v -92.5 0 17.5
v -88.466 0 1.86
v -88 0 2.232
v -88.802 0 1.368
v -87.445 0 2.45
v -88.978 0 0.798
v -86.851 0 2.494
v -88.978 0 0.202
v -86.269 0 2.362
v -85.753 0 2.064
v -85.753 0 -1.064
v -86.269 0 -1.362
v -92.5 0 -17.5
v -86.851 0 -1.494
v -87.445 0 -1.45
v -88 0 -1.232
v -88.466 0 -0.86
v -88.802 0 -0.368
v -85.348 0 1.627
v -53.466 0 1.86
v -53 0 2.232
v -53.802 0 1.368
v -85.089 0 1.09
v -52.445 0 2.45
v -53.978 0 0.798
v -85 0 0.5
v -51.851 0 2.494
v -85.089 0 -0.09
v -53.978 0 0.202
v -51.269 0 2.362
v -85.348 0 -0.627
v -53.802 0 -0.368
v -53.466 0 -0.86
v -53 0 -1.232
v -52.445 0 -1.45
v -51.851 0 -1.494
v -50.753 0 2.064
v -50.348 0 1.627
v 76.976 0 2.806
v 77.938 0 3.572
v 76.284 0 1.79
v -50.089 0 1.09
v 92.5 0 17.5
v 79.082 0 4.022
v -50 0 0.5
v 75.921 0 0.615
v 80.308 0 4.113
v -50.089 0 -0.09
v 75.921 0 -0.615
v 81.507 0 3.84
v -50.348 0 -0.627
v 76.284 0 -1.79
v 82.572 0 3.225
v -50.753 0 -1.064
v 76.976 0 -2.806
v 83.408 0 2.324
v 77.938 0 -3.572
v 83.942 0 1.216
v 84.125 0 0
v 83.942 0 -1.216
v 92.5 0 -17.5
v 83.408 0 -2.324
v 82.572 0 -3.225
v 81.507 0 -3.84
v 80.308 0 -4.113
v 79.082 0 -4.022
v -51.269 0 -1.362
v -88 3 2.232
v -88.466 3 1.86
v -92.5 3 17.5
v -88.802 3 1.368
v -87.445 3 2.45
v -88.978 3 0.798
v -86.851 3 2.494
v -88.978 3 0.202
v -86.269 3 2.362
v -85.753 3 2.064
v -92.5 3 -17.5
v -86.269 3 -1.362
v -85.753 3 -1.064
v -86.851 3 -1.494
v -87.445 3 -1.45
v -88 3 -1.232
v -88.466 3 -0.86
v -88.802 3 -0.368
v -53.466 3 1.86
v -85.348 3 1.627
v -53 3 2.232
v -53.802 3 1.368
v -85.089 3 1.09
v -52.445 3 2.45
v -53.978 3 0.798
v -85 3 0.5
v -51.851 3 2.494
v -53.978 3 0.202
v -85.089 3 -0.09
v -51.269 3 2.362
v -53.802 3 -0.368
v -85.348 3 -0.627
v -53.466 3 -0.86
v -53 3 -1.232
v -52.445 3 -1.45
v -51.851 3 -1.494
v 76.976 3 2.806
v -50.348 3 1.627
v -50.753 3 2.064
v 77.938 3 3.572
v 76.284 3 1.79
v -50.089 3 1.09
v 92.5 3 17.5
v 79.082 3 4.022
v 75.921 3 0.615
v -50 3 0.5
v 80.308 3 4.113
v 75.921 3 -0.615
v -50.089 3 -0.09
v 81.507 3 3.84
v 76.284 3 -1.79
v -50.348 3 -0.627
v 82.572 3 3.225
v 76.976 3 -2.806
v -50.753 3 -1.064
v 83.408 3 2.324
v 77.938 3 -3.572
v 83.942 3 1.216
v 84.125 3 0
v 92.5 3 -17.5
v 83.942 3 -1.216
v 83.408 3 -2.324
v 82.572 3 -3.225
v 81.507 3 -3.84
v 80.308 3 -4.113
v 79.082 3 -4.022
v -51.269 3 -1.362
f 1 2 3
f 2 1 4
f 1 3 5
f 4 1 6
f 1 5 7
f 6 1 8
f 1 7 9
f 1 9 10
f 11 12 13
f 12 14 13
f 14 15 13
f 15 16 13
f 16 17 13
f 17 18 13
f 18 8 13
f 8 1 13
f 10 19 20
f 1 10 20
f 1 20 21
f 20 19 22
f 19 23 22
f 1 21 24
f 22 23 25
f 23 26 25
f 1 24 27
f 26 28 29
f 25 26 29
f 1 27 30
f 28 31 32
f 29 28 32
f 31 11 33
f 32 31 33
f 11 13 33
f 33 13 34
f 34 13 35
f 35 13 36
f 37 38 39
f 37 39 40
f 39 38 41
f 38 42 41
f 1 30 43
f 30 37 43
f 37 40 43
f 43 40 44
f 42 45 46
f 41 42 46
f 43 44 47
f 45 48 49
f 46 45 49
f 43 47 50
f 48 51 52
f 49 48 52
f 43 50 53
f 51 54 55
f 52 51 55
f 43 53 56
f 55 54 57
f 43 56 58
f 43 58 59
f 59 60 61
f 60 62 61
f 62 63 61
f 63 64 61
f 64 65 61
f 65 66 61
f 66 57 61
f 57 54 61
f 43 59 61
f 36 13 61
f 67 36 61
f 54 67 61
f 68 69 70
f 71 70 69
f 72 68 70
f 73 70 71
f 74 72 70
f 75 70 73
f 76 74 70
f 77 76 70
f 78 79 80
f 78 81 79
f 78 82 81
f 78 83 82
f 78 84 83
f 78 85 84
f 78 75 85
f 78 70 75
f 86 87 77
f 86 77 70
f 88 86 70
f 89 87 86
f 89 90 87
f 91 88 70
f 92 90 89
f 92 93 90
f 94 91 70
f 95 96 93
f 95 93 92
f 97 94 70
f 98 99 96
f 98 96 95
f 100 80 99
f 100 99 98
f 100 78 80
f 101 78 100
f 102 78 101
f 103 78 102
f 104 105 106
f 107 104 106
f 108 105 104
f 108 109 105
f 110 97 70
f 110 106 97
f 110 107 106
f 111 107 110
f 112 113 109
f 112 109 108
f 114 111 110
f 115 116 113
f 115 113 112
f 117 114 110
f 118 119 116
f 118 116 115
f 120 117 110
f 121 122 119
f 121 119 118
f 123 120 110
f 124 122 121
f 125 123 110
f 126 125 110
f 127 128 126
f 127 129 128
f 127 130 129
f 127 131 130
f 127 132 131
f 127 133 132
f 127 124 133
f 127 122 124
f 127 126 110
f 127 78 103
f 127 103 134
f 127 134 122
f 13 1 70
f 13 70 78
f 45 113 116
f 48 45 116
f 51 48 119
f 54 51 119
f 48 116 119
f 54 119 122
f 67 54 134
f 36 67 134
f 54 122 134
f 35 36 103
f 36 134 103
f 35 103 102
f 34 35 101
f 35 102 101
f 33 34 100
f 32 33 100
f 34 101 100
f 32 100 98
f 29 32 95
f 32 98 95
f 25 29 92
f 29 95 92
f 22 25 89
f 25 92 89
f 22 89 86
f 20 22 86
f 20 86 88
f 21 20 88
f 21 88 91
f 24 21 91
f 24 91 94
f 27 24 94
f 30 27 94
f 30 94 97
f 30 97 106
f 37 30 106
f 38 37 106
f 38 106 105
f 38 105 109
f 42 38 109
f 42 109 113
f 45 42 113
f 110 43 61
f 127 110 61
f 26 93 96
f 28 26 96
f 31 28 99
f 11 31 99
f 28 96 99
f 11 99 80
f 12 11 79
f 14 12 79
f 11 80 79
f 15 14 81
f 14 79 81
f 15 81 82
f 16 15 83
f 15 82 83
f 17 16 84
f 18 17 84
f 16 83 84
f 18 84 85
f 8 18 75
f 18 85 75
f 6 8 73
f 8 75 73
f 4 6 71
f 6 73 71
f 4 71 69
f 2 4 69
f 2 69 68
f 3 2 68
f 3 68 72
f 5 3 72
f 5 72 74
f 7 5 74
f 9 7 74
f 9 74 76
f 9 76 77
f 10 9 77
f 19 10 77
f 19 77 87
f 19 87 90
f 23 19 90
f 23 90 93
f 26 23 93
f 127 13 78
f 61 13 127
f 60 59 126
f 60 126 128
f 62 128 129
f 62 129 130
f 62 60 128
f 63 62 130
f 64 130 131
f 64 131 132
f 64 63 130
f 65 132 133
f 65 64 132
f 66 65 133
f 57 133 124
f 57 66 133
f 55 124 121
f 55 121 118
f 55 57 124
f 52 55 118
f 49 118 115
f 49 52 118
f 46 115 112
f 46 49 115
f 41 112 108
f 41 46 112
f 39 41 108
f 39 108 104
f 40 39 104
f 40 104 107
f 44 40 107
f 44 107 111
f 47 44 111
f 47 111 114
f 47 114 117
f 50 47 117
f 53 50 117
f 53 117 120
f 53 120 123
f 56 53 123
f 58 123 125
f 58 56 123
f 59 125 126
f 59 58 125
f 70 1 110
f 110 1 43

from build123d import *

# Parameters (mm, degrees)
SKETCH1_W           = 185
SKETCH1_H           = 35
SKETCH1_R           = 4.125
BOSS_EXTRUDE1_DEPTH = 3
SKETCH2_R           = 2
CUT_EXTRUDE1_DEPTH  = 4


with BuildPart() as part:
    # Sketch1 → Boss-Extrude1 (new body)
    with BuildSketch(Plane(origin=(0, 0, 0), x_dir=(1, 0, 0), z_dir=(0, 1, 0))):
        Rectangle(SKETCH1_W, SKETCH1_H)
        with Locations((80, 0)):
            Circle(SKETCH1_R, mode=Mode.SUBTRACT)
    extrude(amount=BOSS_EXTRUDE1_DEPTH)

    # Sketch2 → Cut-Extrude1 (cut, through all)
    with BuildSketch(Plane(origin=(0, 3, 0), x_dir=(1, 0, 0), z_dir=(0, 1, 0))):
        with Locations((-87, -0.5)):
            Circle(SKETCH2_R)
        with Locations((-52, -0.5)):
            Circle(SKETCH2_R)
    extrude(amount=-CUT_EXTRUDE1_DEPTH, mode=Mode.SUBTRACT)


solid = part.part
